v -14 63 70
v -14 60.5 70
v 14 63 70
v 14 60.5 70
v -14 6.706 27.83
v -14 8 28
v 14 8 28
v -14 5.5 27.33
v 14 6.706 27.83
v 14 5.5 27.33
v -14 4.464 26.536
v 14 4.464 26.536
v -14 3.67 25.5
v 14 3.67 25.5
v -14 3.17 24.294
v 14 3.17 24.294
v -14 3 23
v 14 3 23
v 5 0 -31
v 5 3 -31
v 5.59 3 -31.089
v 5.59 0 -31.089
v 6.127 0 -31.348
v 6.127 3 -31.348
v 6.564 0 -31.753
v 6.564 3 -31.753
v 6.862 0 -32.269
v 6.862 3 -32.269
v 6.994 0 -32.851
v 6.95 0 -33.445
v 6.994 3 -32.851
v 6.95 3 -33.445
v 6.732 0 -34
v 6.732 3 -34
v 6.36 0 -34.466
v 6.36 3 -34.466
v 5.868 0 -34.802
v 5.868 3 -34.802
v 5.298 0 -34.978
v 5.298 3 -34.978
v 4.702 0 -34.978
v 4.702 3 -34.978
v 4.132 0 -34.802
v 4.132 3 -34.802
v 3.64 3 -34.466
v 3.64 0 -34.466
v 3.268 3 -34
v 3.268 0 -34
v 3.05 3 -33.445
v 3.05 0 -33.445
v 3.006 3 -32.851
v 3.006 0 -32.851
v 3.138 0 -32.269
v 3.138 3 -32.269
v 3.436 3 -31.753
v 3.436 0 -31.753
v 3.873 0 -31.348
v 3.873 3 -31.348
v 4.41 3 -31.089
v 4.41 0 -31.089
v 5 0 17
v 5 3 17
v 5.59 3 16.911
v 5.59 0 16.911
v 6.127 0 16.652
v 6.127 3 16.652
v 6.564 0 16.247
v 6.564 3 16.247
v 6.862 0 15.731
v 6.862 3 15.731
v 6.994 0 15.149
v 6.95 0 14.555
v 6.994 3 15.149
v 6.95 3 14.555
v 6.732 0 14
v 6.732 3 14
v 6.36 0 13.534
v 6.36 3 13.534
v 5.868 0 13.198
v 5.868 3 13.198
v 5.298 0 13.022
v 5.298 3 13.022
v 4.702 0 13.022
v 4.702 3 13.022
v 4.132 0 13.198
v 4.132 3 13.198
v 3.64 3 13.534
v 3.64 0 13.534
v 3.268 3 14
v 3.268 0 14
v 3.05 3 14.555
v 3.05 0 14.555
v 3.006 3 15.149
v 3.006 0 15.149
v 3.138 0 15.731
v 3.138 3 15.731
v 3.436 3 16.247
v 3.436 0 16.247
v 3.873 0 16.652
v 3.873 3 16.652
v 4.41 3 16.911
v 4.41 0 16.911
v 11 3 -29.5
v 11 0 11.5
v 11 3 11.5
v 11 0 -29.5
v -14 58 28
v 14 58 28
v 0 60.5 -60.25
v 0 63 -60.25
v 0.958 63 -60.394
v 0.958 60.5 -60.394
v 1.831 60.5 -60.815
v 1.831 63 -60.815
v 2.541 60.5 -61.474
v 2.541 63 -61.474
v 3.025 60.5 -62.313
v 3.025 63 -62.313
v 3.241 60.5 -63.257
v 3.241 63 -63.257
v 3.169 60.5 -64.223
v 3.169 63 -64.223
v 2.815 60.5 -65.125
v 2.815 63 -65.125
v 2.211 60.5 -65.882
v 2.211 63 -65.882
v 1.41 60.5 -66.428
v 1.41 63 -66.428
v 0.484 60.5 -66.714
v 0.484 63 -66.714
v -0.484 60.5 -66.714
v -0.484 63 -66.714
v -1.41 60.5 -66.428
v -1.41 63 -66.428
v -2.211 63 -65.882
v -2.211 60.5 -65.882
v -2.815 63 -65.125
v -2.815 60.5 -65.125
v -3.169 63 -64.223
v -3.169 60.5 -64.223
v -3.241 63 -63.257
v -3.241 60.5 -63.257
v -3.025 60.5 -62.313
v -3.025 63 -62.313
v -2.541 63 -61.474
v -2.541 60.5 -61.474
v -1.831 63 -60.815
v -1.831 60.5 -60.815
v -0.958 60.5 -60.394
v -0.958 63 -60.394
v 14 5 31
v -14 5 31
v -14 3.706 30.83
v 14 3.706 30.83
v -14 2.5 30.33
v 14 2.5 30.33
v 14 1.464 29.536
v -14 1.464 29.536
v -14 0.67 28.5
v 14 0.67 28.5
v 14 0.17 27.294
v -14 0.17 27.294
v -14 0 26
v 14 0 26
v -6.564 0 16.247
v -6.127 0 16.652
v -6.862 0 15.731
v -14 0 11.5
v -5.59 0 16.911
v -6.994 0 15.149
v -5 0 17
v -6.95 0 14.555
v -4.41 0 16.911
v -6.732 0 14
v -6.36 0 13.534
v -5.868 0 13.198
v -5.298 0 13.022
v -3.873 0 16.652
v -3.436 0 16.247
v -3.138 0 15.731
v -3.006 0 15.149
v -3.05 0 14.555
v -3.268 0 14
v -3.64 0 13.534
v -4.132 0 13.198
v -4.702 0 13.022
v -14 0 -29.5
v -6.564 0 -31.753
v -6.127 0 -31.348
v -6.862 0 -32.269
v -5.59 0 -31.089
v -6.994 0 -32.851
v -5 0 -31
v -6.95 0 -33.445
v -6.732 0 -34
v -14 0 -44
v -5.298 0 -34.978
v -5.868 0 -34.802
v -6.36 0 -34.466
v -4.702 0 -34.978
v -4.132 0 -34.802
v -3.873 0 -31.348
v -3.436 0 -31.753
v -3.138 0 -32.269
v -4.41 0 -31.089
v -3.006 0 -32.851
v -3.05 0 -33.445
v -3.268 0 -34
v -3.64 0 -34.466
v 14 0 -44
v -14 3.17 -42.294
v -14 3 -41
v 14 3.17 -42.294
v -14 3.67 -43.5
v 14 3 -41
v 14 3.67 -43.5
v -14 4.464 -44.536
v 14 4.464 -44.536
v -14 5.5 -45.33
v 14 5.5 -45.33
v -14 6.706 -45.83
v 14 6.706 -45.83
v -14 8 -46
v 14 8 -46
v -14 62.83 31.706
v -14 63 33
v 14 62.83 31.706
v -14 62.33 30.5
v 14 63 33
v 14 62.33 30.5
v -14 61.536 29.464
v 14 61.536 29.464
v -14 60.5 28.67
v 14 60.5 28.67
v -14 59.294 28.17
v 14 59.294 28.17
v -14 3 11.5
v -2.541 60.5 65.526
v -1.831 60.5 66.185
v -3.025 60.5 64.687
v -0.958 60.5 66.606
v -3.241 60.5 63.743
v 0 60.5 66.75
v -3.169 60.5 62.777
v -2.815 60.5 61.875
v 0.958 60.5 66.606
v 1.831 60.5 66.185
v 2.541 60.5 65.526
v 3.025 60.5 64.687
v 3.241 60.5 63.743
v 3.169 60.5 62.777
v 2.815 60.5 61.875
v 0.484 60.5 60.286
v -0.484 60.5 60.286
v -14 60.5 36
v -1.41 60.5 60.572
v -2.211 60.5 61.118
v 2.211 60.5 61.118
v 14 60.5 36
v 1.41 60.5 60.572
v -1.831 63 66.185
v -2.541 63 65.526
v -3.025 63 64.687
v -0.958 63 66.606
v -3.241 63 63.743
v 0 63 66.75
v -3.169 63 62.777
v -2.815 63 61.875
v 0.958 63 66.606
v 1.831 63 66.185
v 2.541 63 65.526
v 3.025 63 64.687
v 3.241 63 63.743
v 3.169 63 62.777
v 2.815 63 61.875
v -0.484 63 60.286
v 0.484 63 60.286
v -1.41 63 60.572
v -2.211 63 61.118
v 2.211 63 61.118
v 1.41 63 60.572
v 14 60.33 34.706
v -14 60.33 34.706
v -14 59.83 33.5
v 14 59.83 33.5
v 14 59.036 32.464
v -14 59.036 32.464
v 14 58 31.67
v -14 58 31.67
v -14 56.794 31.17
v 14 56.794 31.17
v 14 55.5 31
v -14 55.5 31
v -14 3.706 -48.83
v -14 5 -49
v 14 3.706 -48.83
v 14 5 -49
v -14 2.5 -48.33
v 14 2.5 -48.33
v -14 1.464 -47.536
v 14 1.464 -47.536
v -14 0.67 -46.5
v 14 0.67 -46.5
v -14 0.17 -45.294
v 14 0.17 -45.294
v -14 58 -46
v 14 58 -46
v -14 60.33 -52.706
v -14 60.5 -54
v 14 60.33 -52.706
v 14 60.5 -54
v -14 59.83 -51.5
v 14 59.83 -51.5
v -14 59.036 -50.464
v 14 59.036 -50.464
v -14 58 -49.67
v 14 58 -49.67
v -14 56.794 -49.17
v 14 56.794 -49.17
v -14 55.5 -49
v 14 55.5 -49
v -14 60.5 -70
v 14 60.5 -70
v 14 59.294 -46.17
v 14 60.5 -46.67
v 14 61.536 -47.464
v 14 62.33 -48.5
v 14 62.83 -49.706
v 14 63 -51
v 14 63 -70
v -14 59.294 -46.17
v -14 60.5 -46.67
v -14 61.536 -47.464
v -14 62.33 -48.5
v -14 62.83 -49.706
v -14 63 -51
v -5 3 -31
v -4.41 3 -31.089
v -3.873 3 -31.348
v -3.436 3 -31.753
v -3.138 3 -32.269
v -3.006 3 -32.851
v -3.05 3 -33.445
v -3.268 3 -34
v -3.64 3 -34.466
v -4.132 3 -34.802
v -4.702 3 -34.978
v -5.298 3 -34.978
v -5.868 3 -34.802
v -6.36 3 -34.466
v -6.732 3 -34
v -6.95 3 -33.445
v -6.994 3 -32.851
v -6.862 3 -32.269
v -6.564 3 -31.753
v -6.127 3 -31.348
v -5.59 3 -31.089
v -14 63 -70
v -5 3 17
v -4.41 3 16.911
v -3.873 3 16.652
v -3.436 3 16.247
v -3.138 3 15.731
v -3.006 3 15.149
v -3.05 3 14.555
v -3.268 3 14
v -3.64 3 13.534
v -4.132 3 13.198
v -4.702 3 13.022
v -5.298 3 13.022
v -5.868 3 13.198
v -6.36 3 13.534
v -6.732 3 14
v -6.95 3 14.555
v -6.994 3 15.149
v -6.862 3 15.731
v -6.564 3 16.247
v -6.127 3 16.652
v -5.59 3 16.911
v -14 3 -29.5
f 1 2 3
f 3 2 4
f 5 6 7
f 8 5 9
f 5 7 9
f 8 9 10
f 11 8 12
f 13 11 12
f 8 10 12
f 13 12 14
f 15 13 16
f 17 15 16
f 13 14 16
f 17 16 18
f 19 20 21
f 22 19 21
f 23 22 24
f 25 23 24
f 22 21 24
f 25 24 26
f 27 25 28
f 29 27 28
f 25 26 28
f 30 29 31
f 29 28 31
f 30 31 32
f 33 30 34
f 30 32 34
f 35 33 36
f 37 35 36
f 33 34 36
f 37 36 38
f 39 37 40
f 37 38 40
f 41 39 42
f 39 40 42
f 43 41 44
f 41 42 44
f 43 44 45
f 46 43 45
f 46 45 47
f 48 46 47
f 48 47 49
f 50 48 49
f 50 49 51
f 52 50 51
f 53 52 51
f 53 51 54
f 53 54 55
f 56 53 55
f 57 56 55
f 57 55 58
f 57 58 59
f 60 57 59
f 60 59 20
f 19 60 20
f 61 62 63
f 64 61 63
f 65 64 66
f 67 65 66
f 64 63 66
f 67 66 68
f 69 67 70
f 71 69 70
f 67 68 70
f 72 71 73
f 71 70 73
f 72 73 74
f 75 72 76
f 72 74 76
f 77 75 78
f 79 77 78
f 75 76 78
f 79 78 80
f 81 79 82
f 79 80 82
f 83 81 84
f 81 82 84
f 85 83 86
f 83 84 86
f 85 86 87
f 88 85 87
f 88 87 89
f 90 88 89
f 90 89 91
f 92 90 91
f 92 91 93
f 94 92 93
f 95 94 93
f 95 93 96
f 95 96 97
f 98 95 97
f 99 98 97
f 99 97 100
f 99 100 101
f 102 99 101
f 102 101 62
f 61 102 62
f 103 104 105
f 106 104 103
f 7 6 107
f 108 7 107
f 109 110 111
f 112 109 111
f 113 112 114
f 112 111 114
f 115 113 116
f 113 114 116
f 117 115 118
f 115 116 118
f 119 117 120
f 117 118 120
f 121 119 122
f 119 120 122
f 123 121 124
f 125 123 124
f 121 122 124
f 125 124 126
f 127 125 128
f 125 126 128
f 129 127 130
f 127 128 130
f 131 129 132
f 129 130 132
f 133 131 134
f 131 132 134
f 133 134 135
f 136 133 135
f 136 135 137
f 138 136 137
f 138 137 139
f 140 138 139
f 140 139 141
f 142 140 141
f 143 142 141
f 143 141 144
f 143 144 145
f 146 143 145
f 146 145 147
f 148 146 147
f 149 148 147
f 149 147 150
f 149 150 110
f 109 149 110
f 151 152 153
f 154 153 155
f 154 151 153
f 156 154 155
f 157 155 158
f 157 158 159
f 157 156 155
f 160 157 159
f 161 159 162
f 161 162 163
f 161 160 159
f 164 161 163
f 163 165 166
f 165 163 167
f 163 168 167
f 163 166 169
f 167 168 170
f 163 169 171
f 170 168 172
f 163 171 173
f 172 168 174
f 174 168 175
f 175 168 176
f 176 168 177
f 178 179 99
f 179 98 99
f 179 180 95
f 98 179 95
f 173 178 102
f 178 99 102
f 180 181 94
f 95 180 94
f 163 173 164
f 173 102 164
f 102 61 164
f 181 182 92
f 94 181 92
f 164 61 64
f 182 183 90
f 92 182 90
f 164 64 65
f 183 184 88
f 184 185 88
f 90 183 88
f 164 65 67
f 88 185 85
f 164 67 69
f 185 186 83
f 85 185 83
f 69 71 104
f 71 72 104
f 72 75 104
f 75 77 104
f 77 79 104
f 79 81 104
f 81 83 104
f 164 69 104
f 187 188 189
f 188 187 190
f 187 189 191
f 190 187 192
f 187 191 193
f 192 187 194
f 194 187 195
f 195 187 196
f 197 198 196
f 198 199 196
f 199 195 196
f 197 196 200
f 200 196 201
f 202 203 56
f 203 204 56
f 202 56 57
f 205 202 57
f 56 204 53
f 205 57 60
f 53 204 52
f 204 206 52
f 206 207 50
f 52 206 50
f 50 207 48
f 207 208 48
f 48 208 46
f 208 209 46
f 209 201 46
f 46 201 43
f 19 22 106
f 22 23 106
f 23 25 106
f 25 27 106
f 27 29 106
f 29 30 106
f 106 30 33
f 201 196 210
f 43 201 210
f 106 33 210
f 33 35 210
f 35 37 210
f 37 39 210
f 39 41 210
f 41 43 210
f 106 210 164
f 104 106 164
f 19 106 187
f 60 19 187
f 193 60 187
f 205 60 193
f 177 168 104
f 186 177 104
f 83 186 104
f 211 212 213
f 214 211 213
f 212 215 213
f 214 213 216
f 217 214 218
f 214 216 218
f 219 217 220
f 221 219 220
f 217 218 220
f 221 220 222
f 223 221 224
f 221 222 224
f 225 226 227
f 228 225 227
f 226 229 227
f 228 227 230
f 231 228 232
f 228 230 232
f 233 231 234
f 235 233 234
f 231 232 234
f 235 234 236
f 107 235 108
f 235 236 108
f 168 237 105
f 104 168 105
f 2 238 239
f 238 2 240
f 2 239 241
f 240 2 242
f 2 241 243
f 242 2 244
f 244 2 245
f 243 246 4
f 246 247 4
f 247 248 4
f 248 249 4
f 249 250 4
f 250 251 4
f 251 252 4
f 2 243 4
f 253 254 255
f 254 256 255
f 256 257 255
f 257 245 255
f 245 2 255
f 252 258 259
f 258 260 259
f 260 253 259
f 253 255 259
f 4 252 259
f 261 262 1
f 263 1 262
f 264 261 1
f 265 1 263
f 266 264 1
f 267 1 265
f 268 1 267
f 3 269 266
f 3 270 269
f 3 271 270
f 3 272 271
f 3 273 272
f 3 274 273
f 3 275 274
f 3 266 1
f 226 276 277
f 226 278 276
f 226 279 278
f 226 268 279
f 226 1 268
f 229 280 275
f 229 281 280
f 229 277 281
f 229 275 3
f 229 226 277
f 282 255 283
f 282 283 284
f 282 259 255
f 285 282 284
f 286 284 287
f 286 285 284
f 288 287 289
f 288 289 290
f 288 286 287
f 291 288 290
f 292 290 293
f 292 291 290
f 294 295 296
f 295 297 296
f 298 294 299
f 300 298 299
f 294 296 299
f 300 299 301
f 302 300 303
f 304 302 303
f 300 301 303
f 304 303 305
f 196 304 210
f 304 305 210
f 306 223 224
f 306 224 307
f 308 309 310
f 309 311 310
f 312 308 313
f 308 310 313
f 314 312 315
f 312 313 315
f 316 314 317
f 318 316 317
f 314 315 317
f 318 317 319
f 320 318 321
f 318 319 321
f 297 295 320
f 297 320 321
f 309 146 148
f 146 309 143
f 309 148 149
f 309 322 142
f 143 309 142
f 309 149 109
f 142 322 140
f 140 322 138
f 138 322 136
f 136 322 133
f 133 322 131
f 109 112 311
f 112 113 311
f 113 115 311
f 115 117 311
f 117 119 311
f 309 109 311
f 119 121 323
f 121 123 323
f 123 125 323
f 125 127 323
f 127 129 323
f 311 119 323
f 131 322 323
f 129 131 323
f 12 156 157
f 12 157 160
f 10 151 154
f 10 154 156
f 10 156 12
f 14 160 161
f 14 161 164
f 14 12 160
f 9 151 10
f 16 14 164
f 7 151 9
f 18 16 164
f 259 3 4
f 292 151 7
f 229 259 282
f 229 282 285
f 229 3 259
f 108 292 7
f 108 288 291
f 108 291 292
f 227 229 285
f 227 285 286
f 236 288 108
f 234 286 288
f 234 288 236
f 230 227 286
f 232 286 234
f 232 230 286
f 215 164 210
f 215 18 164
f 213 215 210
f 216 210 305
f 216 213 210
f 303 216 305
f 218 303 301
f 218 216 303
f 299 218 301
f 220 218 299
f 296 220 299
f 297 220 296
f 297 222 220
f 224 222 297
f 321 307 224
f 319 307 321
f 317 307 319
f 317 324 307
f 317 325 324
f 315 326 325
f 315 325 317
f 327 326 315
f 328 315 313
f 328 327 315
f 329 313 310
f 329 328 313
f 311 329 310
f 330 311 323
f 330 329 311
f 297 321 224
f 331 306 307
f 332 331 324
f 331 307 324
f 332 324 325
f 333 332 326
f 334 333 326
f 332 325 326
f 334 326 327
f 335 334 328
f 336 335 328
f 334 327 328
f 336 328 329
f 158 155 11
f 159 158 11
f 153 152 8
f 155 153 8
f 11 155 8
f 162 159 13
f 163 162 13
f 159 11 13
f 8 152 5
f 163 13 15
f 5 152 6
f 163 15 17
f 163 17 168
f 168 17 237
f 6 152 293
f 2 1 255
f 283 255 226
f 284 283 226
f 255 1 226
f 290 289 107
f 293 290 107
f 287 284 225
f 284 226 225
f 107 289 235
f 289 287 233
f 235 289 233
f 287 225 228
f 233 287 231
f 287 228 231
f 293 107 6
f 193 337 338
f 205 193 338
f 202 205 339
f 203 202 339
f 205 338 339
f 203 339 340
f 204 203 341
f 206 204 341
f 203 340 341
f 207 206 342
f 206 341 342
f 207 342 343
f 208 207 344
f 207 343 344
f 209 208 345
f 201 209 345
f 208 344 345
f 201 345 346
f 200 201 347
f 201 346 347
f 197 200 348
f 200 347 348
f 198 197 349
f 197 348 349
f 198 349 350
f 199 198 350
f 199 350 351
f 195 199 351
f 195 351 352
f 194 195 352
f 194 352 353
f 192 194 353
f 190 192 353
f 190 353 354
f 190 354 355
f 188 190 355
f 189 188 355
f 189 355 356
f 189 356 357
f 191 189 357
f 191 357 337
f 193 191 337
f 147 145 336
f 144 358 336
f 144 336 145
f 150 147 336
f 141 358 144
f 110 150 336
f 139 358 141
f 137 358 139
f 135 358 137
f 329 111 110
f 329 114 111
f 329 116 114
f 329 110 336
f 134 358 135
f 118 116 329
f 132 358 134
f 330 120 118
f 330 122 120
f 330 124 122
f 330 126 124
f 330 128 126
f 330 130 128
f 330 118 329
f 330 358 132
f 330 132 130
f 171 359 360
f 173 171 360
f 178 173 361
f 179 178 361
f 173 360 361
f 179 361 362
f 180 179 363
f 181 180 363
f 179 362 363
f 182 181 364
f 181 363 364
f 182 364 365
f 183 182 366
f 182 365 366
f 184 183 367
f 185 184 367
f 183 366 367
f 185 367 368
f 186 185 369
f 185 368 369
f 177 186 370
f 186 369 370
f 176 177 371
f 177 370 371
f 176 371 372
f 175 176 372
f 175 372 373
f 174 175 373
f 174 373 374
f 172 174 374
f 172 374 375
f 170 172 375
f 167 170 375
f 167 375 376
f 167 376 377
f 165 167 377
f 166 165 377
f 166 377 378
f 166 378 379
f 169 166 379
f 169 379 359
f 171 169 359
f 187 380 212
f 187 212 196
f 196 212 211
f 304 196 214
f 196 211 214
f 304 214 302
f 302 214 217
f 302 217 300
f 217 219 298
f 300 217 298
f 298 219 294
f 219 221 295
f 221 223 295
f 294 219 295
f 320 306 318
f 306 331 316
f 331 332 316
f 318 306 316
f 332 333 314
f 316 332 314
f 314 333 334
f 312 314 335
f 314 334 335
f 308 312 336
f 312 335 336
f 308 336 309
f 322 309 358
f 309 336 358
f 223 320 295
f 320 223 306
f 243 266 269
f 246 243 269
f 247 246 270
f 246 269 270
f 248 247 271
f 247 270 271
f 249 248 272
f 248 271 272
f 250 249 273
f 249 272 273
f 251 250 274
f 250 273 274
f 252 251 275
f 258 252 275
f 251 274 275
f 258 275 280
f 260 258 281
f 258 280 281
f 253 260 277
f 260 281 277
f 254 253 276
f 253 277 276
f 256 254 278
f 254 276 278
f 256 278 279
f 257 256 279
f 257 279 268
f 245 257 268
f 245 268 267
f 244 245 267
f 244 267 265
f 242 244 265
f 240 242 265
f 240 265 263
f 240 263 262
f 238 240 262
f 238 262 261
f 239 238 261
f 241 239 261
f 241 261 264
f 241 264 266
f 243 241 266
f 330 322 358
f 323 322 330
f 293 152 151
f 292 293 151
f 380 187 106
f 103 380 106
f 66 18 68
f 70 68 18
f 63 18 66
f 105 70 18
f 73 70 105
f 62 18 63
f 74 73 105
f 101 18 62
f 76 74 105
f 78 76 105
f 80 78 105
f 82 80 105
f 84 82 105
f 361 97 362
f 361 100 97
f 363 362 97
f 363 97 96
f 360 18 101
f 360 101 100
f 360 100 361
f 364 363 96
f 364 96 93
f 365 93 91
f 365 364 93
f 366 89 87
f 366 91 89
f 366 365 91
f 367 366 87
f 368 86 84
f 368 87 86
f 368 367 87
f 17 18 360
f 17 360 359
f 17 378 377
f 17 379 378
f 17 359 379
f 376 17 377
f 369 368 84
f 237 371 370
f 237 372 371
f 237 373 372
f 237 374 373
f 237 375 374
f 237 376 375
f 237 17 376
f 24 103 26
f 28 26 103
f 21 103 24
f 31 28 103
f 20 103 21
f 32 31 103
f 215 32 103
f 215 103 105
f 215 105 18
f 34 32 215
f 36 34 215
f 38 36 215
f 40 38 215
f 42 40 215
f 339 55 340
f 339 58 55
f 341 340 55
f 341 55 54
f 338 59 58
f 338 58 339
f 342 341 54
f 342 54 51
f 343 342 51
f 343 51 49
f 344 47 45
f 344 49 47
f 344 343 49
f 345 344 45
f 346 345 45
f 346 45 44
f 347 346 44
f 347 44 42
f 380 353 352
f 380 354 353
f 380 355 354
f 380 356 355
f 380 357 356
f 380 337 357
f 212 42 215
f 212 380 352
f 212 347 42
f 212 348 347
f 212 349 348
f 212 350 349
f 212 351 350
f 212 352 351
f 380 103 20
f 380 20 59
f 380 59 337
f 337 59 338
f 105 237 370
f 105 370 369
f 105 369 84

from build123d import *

# Parameters (mm, degrees)
SKETCH1_W               = 32
SKETCH1_H               = 80
BOSS_EXTRUDE1_DEPTH     = 3
SKETCH4_W               = 32
SKETCH4_H               = 80
SKETCH4_W_2             = 27
SKETCH4_H_2             = 74
BOSS_EXTRUDE2_DEPTH     = 57.5
SKETCH5_W               = 32
SKETCH5_H               = 140
BOSS_EXTRUDE3_DEPTH     = 2.5
CUT_EXTRUDE1_DEPTH      = 50.8
CUT_EXTRUDE1_DEPTH_BACK = 94.573500522
SKETCH2_W               = 22
SKETCH2_H               = 41
SKETCH6_R               = 3.25
SKETCH6_W               = 22
SKETCH6_H               = 74
CUT_EXTRUDE2_DEPTH      = 25.4
CUT_EXTRUDE3_DEPTH      = 100.463561167
CUT_EXTRUDE3_DEPTH_BACK = 100.463561167
SKETCH8_W               = 74
SKETCH8_H               = 60
SKETCH7_R               = 2
CUT_EXTRUDE4_DEPTH      = 94.573500522
SKETCH10_W              = 2
SKETCH10_H              = 140
CUT_EXTRUDE5_DEPTH      = 96.524865873
FILLET1_R               = 5
SKETCH13_W              = 3
SKETCH13_H              = 41
CUT_EXTRUDE7_DEPTH      = 94.252345815


with BuildPart() as part:
    # Sketch1 → Boss-Extrude1 (new body)
    with BuildSketch(Plane(origin=(0, 0, 0), x_dir=(1, 0, 0), z_dir=(0, 1, 0))):
        with Locations((0, 9)):
            Rectangle(SKETCH1_W, SKETCH1_H)
    extrude(amount=BOSS_EXTRUDE1_DEPTH)

    # Sketch4 → Boss-Extrude2 (add)
    with BuildSketch(Plane(origin=(0, 3, 0), x_dir=(1, 0, 0), z_dir=(0, 1, 0))):
        with Locations((0, 9)):
            Rectangle(SKETCH4_W, SKETCH4_H)
        with Locations((0, 9)):
            Rectangle(SKETCH4_W_2, SKETCH4_H_2, mode=Mode.SUBTRACT)
    extrude(amount=BOSS_EXTRUDE2_DEPTH)

    # Sketch5 → Boss-Extrude3 (add)
    with BuildSketch(Plane(origin=(0, 60.5, 0), x_dir=(1, 0, 0), z_dir=(0, 1, 0))):
        Rectangle(SKETCH5_W, SKETCH5_H)
    extrude(amount=BOSS_EXTRUDE3_DEPTH)

    # Sketch2 → Cut-Extrude1 (cut, two sides: drawn at the far end of the back side and taken through both)
    with BuildSketch(Plane(origin=(0, 3, 0), x_dir=(1, 0, 0), z_dir=(0, 1, 0)).offset(-CUT_EXTRUDE1_DEPTH_BACK)):
        with Locations((0, 9)):
            Rectangle(SKETCH2_W, SKETCH2_H)
    extrude(amount=CUT_EXTRUDE1_DEPTH + CUT_EXTRUDE1_DEPTH_BACK, mode=Mode.SUBTRACT)

    # Sketch6 → Cut-Extrude2 (cut)
    with BuildSketch(Plane(origin=(0, 63, 0), x_dir=(1, 0, 0), z_dir=(0, 1, 0))):
        with Locations(Location((0, 63.5, 0), (0, 0, 270))):
            Circle(SKETCH6_R)
        with Locations(Location((0, -63.5, 0), (0, 0, 270))):
            Circle(SKETCH6_R)
        with Locations((0, 9)):
            Rectangle(SKETCH6_W, SKETCH6_H)
    extrude(amount=-CUT_EXTRUDE2_DEPTH, mode=Mode.SUBTRACT)

    # Sketch8 → Cut-Extrude3 (cut, two sides: drawn at the far end of the back side and taken through both)
    with BuildSketch(Plane(origin=(16, 0, 0), x_dir=(0, 0, -1), z_dir=(1, 0, 0)).offset(-CUT_EXTRUDE3_DEPTH_BACK)):
        with Locations((9, 33)):
            Rectangle(SKETCH8_W, SKETCH8_H)
    extrude(amount=CUT_EXTRUDE3_DEPTH + CUT_EXTRUDE3_DEPTH_BACK, mode=Mode.SUBTRACT)

    # Sketch7 → Cut-Extrude4 (cut, through all)
    with BuildSketch(Plane(origin=(0, 3, 0), x_dir=(1, 0, 0), z_dir=(0, 1, 0))):
        with Locations(Location((-5, 33, 0), (0, 0, 270))):
            Circle(SKETCH7_R)
        with Locations(Location((5, 33, 0), (0, 0, 270))):
            Circle(SKETCH7_R)
        with Locations(Location((-5, -15, 0), (0, 0, 270))):
            Circle(SKETCH7_R)
        with Locations(Location((5, -15, 0), (0, 0, 270))):
            Circle(SKETCH7_R)
    extrude(amount=-CUT_EXTRUDE4_DEPTH, mode=Mode.SUBTRACT)

    # Sketch10 → Cut-Extrude5 (cut, through all)
    with BuildSketch(Plane(origin=(0, 63, 0), x_dir=(1, 0, 0), z_dir=(0, 1, 0))):
        with Locations((-15, 0)):
            Rectangle(SKETCH10_W, SKETCH10_H)
        with Locations((15, 0)):
            Rectangle(SKETCH10_W, SKETCH10_H)
    extrude(amount=-CUT_EXTRUDE5_DEPTH, mode=Mode.SUBTRACT)

    # Fillet1
    fillet1_edges = [part.edges().sort_by_distance(p)[0] for p in [
        (0, 63, -46),
        (0, 60.5, 31),
        (0, 60.5, -49),
        (0, 0, -49),
        (0, 0, 31),
        (0, 3, 28),
        (0, 63, 28),
        (0, 3, -46),
    ]]
    fillet(fillet1_edges, radius=FILLET1_R)

    # Sketch13 → Cut-Extrude7 (cut, through all)
    with BuildSketch(Plane(origin=(0, 3, 0), x_dir=(1, 0, 0), z_dir=(0, 1, 0))):
        with Locations((-12.5, 9)):
            Rectangle(SKETCH13_W, SKETCH13_H)
    extrude(amount=-CUT_EXTRUDE7_DEPTH, mode=Mode.SUBTRACT)


solid = part.part
